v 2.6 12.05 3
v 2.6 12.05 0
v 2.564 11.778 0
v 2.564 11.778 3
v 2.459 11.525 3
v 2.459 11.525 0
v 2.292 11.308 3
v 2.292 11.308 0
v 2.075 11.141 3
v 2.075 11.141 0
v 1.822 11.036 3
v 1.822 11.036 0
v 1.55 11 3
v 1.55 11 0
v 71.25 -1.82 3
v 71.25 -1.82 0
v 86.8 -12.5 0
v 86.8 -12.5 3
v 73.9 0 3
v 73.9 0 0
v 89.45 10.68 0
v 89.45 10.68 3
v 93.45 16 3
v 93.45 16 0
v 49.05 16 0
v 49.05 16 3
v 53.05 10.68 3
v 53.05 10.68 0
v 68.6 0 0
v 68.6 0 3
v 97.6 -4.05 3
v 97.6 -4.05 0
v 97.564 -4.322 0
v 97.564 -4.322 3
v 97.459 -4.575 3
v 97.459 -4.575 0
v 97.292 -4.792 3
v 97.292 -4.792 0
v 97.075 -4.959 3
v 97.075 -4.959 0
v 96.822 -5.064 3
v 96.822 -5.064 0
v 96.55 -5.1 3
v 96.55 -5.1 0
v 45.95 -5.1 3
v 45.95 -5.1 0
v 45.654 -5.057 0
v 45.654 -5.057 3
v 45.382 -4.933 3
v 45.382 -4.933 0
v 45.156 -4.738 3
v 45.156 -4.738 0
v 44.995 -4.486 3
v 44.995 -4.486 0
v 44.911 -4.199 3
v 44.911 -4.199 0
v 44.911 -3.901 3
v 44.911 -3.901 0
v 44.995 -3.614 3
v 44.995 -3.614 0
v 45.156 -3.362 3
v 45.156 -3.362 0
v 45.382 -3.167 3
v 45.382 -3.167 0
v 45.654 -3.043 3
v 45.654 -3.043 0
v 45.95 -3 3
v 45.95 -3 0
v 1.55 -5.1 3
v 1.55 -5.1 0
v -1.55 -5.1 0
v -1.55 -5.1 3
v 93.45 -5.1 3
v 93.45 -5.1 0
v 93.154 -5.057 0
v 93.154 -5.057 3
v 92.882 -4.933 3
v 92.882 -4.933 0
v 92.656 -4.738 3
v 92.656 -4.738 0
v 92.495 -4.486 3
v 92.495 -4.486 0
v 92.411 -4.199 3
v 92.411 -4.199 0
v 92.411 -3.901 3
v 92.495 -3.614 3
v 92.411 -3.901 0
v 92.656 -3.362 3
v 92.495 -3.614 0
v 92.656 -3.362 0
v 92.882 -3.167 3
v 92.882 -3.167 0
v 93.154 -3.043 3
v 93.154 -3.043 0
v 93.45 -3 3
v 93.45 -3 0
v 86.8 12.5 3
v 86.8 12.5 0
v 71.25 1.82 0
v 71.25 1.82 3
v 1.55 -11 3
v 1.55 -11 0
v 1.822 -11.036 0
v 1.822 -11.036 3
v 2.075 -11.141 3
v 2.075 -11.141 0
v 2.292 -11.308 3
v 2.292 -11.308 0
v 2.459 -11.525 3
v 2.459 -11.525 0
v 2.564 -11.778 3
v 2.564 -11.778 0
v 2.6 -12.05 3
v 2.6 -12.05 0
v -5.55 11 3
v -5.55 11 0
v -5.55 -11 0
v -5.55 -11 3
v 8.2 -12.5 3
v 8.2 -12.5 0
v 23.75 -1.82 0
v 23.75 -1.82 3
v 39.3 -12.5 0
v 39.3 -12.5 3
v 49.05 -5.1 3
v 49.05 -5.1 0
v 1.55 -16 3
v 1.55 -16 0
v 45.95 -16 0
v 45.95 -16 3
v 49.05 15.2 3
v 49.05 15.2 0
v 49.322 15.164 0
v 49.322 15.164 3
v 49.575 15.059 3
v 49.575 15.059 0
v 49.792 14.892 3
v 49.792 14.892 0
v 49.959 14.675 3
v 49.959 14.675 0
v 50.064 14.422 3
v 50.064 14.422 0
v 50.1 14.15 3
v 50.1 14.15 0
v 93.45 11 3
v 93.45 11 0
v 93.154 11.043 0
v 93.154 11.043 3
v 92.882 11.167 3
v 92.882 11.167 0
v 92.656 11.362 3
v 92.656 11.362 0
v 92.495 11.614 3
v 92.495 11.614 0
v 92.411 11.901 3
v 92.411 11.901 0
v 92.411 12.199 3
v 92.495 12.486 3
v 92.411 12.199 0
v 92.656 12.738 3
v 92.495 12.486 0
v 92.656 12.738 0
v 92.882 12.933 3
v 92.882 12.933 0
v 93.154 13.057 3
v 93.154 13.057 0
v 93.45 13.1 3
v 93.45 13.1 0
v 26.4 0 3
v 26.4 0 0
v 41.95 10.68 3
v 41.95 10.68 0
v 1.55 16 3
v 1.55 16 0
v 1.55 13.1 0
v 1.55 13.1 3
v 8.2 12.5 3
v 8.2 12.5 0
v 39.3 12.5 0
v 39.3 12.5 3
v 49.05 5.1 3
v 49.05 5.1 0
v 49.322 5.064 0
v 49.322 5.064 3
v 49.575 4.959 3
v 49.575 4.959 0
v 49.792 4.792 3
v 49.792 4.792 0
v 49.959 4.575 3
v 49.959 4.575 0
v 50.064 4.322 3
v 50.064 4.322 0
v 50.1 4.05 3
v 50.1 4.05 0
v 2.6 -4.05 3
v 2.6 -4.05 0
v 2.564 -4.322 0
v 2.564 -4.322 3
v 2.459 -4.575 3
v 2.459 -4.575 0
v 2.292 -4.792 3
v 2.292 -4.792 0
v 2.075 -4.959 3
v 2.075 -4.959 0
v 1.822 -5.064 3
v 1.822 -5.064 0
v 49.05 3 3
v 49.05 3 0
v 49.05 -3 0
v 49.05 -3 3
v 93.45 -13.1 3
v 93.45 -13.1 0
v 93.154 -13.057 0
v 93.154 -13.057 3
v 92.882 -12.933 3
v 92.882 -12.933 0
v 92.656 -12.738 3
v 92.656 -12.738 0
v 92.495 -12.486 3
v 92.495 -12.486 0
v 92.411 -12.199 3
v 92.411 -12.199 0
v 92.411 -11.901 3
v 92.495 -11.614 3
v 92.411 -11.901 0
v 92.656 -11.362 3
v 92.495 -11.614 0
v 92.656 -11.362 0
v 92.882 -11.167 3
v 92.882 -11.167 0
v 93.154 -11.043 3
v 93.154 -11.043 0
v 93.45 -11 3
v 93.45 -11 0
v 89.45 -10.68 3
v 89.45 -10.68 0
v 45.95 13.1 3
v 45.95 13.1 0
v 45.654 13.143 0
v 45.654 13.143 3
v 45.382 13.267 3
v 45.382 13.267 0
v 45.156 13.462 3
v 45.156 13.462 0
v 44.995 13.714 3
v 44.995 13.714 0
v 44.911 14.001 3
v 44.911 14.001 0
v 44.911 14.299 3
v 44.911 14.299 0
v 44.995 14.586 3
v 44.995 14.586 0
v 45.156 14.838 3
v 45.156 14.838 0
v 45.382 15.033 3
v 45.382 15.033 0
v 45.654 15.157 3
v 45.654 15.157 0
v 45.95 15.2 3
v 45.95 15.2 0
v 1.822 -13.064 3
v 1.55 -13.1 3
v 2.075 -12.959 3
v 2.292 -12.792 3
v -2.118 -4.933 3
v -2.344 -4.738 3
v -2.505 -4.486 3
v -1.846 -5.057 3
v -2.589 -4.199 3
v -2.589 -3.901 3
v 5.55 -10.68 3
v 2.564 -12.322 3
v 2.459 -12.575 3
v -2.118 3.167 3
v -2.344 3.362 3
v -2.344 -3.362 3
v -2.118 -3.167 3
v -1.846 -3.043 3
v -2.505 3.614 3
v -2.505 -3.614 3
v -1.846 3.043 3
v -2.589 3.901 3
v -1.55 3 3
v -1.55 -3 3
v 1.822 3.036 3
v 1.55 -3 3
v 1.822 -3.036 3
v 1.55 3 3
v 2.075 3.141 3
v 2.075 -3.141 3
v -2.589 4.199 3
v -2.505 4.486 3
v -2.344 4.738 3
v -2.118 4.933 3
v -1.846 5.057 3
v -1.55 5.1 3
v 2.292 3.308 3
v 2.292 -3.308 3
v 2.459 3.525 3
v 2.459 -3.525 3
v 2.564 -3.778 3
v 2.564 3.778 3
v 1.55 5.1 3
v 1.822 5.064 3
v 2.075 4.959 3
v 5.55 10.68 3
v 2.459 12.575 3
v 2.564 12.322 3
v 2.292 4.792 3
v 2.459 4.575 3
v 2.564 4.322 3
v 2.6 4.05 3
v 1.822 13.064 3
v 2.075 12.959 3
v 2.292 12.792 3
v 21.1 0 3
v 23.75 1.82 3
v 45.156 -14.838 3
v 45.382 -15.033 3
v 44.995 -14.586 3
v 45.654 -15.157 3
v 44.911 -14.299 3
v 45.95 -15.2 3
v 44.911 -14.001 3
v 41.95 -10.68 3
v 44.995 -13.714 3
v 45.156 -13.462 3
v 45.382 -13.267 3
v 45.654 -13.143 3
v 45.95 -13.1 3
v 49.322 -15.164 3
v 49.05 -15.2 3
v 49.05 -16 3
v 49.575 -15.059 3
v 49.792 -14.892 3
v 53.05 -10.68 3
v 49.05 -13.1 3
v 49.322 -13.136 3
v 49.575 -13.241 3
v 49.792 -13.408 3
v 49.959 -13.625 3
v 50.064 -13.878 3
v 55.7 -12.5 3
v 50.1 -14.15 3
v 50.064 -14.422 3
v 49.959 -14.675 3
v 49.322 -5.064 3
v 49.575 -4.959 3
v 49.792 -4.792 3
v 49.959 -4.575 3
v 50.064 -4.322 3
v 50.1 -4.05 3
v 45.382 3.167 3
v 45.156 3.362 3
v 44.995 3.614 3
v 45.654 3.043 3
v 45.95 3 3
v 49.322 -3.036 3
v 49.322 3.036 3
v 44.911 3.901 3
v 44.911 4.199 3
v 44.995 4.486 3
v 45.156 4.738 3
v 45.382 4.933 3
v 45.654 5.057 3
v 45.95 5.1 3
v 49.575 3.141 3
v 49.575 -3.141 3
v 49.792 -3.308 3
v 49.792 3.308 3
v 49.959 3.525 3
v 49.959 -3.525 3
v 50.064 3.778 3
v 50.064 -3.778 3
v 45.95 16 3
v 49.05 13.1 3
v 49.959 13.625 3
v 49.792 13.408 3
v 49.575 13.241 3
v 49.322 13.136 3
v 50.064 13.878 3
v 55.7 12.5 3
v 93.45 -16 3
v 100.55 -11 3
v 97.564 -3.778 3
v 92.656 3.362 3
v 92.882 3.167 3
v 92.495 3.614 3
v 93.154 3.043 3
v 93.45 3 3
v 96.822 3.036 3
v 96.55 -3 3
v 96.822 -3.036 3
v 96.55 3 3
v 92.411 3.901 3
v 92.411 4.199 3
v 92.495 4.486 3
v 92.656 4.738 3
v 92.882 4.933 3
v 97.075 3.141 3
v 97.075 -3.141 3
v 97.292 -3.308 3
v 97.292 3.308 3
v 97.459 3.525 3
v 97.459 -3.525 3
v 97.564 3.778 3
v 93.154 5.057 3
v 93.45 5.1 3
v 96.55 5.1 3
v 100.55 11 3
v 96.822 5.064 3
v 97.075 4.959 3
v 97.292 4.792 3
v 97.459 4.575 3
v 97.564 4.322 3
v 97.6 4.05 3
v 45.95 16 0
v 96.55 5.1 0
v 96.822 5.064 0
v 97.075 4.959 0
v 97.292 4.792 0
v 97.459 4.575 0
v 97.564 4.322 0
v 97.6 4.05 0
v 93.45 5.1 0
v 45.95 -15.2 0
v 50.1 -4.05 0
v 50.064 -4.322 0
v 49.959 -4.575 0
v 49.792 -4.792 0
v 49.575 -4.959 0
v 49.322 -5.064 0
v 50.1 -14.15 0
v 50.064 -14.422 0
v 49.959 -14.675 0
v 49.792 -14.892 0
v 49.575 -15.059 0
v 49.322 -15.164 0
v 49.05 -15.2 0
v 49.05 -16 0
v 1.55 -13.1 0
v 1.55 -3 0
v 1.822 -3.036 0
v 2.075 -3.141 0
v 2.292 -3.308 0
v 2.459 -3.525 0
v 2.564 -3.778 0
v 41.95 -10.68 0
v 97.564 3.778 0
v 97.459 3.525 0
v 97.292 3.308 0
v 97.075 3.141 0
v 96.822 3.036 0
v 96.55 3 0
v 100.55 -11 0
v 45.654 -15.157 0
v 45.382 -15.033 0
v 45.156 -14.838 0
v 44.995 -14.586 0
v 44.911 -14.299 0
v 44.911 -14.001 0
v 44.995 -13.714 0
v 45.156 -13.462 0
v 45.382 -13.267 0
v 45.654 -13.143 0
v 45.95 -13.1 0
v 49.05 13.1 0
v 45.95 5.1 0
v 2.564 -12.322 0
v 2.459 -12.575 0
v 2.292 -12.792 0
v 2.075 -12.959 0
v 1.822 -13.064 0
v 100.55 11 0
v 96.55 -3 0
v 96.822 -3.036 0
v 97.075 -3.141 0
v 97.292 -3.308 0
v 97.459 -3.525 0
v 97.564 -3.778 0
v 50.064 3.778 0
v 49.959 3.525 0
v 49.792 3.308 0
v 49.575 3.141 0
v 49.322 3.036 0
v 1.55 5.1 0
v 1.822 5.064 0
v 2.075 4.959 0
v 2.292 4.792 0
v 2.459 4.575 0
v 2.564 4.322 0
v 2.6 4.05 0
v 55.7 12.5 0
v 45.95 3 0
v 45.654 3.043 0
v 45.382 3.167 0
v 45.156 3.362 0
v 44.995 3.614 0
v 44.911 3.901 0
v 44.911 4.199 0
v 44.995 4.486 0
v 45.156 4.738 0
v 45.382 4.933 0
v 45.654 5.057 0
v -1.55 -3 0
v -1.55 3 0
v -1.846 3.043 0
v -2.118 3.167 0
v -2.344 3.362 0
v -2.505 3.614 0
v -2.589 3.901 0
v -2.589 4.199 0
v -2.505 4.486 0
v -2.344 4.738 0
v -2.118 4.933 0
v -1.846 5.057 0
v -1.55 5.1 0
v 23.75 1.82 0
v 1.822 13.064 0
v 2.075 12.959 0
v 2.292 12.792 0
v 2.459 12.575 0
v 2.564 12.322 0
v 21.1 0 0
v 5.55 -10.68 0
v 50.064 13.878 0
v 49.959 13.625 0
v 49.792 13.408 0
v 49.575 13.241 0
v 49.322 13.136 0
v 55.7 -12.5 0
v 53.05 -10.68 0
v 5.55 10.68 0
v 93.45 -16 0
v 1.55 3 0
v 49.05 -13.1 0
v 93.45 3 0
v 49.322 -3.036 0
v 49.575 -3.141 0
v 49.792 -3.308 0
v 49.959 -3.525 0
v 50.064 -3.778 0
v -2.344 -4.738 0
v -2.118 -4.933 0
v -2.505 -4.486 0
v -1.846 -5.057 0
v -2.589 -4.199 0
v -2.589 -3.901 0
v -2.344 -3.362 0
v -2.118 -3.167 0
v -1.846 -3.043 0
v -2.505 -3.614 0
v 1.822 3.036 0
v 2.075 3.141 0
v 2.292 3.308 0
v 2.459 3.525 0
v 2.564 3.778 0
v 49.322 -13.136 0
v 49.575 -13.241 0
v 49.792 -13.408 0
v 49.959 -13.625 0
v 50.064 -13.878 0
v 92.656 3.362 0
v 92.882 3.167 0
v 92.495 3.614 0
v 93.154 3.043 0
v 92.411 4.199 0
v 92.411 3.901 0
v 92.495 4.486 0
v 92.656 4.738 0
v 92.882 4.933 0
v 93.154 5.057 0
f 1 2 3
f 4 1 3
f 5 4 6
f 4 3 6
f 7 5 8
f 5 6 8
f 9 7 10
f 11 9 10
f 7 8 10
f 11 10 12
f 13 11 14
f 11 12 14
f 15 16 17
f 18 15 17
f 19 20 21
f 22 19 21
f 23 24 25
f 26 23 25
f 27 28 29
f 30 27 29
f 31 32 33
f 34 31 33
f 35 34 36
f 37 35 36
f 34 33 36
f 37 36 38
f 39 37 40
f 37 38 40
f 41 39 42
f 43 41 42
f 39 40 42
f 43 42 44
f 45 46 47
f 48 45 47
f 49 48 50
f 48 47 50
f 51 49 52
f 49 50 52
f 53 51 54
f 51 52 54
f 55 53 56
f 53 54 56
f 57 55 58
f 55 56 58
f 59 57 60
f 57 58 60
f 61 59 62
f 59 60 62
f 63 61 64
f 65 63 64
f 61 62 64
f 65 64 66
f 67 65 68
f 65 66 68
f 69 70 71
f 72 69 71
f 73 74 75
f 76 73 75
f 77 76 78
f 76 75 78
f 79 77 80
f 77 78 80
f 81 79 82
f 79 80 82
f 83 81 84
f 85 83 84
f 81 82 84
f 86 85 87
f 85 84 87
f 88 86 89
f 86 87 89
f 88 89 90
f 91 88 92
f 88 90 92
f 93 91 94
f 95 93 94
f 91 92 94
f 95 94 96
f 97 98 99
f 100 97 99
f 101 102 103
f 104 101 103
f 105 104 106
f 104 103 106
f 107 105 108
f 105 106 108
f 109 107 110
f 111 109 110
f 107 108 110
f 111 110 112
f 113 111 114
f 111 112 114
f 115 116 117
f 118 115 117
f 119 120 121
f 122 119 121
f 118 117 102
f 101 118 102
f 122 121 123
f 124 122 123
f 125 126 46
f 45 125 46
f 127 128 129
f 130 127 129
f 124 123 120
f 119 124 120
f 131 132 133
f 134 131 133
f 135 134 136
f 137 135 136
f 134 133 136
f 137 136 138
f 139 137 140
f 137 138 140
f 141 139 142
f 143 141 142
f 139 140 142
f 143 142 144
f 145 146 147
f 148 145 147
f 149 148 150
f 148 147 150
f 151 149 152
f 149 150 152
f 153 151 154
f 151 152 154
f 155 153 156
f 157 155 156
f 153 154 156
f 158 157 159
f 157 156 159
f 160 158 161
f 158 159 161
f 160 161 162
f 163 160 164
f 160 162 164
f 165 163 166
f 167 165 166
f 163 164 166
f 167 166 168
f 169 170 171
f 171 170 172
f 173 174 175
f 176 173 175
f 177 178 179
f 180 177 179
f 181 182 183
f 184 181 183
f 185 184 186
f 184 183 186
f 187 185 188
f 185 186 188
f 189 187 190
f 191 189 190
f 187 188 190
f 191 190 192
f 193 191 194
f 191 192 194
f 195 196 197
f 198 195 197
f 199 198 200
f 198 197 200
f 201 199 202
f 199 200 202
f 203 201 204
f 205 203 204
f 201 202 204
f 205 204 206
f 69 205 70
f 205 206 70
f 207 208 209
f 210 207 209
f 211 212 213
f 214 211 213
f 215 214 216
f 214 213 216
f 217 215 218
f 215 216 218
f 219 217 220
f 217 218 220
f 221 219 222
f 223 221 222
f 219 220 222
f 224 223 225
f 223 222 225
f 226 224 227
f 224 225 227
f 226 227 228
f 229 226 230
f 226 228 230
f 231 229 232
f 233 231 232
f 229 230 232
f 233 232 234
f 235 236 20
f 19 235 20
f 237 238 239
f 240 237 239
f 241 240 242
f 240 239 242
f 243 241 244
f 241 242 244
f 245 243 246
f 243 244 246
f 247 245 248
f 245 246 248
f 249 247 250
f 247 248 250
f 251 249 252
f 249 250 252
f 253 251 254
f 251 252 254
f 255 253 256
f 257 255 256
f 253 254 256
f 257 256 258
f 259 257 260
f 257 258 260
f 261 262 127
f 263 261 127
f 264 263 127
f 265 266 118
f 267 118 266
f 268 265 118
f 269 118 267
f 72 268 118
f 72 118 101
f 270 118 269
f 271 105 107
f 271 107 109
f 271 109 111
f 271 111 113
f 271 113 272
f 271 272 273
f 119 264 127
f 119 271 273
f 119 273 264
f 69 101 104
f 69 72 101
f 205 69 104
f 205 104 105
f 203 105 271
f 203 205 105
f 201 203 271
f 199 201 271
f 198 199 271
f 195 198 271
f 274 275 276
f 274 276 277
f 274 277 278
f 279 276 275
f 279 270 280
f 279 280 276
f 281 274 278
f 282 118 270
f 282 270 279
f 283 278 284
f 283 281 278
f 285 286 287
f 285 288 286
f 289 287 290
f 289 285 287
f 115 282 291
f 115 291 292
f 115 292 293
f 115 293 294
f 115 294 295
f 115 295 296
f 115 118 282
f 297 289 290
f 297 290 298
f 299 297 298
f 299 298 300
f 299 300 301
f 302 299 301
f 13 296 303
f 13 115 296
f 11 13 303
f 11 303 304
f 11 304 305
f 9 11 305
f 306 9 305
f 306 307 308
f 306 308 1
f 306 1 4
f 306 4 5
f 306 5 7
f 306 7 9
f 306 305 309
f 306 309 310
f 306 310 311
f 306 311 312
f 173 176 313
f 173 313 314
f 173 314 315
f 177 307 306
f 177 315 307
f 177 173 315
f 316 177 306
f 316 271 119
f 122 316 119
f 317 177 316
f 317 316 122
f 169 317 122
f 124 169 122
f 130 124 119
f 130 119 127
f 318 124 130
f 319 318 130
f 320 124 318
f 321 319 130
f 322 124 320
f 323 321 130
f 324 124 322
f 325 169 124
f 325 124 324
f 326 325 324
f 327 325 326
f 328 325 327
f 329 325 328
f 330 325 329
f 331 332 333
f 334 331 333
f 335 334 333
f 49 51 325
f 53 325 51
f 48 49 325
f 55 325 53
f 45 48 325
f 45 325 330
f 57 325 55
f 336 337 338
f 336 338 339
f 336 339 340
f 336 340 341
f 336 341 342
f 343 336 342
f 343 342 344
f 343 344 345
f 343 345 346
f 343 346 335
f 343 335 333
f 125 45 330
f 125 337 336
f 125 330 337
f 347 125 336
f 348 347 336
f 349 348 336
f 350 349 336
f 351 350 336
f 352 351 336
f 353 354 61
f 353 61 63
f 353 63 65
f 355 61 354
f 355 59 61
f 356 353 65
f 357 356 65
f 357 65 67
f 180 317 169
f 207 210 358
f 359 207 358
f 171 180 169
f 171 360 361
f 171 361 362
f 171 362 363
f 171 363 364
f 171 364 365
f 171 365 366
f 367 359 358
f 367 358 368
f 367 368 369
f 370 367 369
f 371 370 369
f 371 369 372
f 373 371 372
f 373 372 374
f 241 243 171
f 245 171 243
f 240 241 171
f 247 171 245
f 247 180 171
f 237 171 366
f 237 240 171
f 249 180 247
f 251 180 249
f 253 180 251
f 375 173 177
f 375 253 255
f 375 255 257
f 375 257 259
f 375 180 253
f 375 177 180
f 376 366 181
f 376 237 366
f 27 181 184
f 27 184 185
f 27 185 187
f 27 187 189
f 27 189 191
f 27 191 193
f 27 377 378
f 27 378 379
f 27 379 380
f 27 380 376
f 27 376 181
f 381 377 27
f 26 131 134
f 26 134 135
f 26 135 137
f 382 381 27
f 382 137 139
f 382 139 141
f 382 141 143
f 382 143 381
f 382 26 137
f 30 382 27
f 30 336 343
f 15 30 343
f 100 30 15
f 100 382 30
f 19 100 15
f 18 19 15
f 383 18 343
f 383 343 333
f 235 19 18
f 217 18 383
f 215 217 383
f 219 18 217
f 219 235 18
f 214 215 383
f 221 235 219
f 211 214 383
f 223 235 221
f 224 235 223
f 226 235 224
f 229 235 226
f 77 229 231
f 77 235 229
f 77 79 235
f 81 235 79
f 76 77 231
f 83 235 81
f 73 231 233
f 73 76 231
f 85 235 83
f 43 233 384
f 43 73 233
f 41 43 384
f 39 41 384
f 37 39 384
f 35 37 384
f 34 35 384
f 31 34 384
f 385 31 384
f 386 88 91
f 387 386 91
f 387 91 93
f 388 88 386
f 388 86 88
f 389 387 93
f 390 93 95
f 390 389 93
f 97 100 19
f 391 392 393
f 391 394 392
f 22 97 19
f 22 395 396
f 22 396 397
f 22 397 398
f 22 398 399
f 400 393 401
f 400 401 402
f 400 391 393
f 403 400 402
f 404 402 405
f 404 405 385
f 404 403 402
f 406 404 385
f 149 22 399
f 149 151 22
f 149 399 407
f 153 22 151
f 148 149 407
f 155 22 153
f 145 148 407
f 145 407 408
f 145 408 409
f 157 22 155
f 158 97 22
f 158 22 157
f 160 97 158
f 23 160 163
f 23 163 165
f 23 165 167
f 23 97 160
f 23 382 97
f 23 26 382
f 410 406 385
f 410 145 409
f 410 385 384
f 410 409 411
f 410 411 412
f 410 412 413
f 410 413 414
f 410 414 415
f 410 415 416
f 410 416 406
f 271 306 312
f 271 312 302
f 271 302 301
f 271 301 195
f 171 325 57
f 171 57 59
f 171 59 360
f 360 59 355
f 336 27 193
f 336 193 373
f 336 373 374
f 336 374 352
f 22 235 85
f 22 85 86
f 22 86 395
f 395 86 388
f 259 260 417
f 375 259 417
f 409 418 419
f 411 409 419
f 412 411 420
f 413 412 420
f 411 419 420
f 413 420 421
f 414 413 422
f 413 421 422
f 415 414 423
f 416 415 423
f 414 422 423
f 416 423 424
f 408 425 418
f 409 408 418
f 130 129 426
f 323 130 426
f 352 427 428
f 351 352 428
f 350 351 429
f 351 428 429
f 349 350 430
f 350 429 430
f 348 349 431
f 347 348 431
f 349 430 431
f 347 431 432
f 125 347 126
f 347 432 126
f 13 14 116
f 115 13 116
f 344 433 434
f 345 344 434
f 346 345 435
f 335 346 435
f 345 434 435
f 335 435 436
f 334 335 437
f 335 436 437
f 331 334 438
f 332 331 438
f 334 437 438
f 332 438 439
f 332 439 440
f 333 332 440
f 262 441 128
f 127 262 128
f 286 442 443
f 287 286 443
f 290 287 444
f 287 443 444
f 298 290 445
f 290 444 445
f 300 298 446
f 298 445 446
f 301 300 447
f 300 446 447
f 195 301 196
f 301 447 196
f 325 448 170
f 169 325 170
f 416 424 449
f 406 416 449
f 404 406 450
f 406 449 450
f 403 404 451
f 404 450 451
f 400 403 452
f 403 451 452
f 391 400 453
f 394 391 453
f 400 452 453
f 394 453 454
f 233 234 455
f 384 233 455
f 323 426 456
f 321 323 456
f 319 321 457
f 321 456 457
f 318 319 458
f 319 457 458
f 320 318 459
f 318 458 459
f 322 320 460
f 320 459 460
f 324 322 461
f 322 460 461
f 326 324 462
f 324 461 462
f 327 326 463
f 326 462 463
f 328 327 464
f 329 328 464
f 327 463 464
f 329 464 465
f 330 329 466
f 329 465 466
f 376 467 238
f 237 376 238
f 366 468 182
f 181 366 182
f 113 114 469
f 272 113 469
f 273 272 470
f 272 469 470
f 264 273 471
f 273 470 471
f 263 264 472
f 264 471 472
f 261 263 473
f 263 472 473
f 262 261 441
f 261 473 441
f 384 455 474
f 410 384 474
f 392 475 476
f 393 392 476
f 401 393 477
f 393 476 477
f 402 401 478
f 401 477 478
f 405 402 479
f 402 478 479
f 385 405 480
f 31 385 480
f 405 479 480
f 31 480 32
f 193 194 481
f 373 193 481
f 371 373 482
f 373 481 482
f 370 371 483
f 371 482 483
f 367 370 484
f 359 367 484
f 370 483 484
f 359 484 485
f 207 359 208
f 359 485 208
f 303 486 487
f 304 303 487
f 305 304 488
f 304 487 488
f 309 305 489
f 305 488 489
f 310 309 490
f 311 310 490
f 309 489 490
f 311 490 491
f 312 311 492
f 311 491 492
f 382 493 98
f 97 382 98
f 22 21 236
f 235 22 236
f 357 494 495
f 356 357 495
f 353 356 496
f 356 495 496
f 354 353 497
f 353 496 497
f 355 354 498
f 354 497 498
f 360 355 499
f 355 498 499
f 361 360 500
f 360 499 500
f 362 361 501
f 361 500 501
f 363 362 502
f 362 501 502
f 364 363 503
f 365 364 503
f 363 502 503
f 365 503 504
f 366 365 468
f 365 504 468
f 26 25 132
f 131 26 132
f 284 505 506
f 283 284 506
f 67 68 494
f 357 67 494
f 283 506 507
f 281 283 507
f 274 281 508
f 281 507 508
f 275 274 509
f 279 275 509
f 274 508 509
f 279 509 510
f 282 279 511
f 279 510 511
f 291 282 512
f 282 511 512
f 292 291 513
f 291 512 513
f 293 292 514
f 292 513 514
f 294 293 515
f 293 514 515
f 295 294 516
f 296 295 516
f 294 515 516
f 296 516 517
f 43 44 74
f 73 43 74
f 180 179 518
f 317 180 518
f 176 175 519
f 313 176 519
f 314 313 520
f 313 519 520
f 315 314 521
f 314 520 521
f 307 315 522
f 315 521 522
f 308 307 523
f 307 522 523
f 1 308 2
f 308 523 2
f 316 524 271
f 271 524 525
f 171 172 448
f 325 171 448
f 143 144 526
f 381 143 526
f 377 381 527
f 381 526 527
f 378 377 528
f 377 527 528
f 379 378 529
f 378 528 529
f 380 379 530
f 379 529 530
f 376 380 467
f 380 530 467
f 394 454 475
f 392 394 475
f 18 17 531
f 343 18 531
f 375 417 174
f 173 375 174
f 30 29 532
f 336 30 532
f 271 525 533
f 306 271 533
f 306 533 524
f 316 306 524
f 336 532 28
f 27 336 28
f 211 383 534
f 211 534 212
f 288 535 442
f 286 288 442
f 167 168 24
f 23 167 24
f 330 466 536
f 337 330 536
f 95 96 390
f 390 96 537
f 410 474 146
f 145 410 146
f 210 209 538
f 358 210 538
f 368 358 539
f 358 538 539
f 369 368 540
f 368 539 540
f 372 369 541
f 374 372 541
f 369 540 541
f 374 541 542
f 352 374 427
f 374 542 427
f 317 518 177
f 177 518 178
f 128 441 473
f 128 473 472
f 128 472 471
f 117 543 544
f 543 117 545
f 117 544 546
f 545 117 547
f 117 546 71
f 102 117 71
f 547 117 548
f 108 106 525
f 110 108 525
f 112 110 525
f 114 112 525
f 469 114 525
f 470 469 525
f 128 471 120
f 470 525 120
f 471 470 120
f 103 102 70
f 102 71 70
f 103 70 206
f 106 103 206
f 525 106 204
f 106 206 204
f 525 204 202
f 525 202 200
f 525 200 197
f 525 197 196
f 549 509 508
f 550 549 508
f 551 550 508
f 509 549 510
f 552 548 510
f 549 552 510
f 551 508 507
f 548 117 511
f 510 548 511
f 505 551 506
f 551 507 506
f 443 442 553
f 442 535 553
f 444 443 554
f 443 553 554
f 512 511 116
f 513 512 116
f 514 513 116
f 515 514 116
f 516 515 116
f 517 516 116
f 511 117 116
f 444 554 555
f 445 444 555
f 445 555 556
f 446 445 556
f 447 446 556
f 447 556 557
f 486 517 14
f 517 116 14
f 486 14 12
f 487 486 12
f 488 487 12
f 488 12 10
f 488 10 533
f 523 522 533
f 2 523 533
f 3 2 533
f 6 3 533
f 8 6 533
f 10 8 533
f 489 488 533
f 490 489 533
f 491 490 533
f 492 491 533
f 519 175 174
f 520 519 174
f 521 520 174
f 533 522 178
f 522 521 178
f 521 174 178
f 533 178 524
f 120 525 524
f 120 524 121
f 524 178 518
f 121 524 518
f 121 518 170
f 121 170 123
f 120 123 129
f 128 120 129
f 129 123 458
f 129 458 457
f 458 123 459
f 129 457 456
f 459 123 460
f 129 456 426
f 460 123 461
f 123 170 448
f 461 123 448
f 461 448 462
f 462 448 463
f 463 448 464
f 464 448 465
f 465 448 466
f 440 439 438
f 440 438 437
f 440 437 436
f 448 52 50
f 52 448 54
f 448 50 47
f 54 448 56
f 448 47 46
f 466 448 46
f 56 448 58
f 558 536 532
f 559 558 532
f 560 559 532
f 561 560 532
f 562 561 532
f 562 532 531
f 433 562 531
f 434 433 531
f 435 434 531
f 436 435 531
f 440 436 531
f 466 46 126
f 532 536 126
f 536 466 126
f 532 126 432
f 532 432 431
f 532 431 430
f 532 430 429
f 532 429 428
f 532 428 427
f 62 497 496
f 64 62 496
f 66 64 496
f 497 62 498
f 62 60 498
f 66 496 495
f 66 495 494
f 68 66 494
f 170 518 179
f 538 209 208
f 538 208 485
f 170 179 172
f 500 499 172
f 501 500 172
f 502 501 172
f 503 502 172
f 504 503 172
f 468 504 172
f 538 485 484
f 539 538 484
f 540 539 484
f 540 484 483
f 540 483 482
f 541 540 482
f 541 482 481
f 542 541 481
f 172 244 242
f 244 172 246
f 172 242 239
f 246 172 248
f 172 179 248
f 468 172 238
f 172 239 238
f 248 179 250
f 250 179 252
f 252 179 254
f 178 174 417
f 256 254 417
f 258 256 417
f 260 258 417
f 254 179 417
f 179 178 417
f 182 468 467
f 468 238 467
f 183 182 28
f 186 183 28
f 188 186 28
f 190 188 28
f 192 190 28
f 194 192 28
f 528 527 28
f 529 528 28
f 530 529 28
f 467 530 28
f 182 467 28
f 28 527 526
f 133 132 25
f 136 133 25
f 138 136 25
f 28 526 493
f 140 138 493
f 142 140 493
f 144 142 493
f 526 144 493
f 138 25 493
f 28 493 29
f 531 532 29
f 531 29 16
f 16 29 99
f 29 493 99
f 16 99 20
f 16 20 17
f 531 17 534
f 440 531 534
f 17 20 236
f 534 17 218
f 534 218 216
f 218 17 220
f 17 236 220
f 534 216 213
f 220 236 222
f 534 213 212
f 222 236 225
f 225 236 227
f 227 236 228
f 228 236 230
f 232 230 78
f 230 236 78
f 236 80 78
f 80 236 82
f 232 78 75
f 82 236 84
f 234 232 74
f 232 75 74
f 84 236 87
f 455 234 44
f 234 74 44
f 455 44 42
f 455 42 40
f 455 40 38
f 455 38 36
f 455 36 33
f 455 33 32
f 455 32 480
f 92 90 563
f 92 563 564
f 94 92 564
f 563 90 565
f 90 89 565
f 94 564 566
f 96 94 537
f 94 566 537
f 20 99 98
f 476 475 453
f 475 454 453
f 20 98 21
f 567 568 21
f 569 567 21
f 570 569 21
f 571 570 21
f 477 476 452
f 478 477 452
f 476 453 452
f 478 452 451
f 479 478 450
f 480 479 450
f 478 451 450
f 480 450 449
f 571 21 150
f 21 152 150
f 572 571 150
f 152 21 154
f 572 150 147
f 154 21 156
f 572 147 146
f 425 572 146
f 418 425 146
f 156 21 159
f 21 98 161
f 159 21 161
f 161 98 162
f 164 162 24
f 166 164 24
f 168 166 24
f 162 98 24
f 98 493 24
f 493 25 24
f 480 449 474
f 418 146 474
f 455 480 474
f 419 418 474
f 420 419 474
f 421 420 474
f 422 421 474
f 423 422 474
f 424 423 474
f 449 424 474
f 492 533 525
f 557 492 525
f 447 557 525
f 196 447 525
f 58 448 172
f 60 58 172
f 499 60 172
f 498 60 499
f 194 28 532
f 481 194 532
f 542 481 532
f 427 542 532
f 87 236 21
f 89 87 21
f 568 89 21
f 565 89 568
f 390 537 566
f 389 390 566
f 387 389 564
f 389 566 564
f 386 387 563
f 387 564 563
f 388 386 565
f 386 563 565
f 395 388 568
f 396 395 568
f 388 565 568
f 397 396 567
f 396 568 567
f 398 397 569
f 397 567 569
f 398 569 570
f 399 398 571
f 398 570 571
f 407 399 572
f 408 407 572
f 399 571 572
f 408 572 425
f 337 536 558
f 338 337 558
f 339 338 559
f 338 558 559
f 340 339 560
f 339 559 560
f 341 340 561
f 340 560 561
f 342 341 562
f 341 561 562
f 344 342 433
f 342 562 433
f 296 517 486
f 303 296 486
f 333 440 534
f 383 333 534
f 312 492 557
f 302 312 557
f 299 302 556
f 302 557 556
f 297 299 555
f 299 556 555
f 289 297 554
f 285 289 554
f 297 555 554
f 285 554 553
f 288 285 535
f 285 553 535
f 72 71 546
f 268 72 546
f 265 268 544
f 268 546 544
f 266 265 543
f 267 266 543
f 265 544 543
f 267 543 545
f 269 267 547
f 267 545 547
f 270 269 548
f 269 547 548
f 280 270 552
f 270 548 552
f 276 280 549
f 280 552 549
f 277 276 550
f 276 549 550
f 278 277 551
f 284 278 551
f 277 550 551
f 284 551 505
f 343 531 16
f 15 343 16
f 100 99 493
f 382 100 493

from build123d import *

# Parameters (mm, degrees)
EXTRUDE_1_DEPTH = 3


with BuildPart() as part:
    # 草图1 → 凸台-拉伸1 (new body)
    with BuildSketch(Plane.XY):
        with BuildLine():
            Line((100.55, -11), (100.55, 11))
            Line((100.55, 11), (93.45, 11))
            ThreePointArc((93.45, 11), (92.4, 12.05), (93.45, 13.1))
            Line((93.45, 13.1), (93.45, 16))
            Line((93.45, 16), (49.05, 16))
            Line((49.05, 16), (49.05, 15.2))
            ThreePointArc((49.05, 15.2), (49.79246212, 14.89246212), (50.1, 14.15))
            ThreePointArc((50.1, 14.15), (49.79246212, 13.40753788), (49.05, 13.1))
            Line((49.05, 13.1), (45.95, 13.1))
            ThreePointArc((45.95, 13.1), (44.9, 14.15), (45.95, 15.2))
            Line((45.95, 15.2), (45.95, 16))
            Line((45.95, 16), (1.55, 16))
            Line((1.55, 16), (1.55, 13.1))
            ThreePointArc((1.55, 13.1), (2.29246212, 12.79246212), (2.6, 12.05))
            ThreePointArc((2.6, 12.05), (2.29246212, 11.30753788), (1.55, 11))
            Line((1.55, 11), (-5.55, 11))
            Line((-5.55, 11), (-5.55, -11))
            Line((-5.55, -11), (1.55, -11))
            ThreePointArc((1.55, -11), (2.29246212, -11.30753788), (2.6, -12.05))
            ThreePointArc((2.6, -12.05), (2.29246212, -12.79246212), (1.55, -13.1))
            Line((1.55, -13.1), (1.55, -16))
            Line((1.55, -16), (45.95, -16))
            Line((45.95, -16), (45.95, -15.2))
            ThreePointArc((45.95, -15.2), (44.9, -14.15), (45.95, -13.1))
            Line((45.95, -13.1), (49.05, -13.1))
            ThreePointArc((49.05, -13.1), (49.79246212, -13.40753788), (50.1, -14.15))
            ThreePointArc((50.1, -14.15), (49.79246212, -14.89246212), (49.05, -15.2))
            Line((49.05, -15.2), (49.05, -16))
            Line((49.05, -16), (93.45, -16))
            Line((93.45, -16), (93.45, -13.1))
            ThreePointArc((93.45, -13.1), (92.4, -12.05), (93.45, -11))
            Line((93.45, -11), (100.55, -11))
        make_face()
        with BuildLine():
            ThreePointArc((2.6, -4.05), (2.29246212, -4.79246212), (1.55, -5.1))
            Line((1.55, -5.1), (-1.55, -5.1))
            ThreePointArc((-1.55, -5.1), (-2.6, -4.05), (-1.55, -3))
            Line((-1.55, -3), (-1.55, 3))
            ThreePointArc((-1.55, 3), (-2.6, 4.05), (-1.55, 5.1))
            Line((-1.55, 5.1), (1.55, 5.1))
            ThreePointArc((1.55, 5.1), (2.29246212, 4.79246212), (2.6, 4.05))
            ThreePointArc((2.6, 4.05), (2.29246212, 3.30753788), (1.55, 3))
            Line((1.55, 3), (1.55, -3))
            ThreePointArc((1.55, -3), (2.29246212, -3.30753788), (2.6, -4.05))
        make_face(mode=Mode.SUBTRACT)
        Polygon((39.300498915, -12.5), (8.199501085, -12.5), (23.75, -1.819712284), align=None, mode=Mode.SUBTRACT)
        Polygon((55.699501085, -12.5), (71.25, -1.819712284), (86.800498915, -12.5), align=None, mode=Mode.SUBTRACT)
        with BuildLine():
            ThreePointArc((97.6, -4.05), (97.29246212, -4.79246212), (96.55, -5.1))
            Line((96.55, -5.1), (93.45, -5.1))
            ThreePointArc((93.45, -5.1), (92.4, -4.05), (93.45, -3))
            Line((93.45, -3), (93.45, 3))
            ThreePointArc((93.45, 3), (92.4, 4.05), (93.45, 5.1))
            Line((93.45, 5.1), (96.55, 5.1))
            ThreePointArc((96.55, 5.1), (97.29246212, 4.79246212), (97.6, 4.05))
            ThreePointArc((97.6, 4.05), (97.29246212, 3.30753788), (96.55, 3))
            Line((96.55, 3), (96.55, -3))
            ThreePointArc((96.55, -3), (97.29246212, -3.30753788), (97.6, -4.05))
        make_face(mode=Mode.SUBTRACT)
        Polygon((21.100498915, 0), (5.55, -10.680287716), (5.55, 10.680287716), align=None, mode=Mode.SUBTRACT)
        Polygon((26.399501085, 0), (41.95, 10.680287716), (41.95, -10.680287716), align=None, mode=Mode.SUBTRACT)
        Polygon((23.75, 1.819712284), (8.199501085, 12.5), (39.300498915, 12.5), align=None, mode=Mode.SUBTRACT)
        with BuildLine():
            ThreePointArc((50.1, -4.05), (49.79246212, -4.79246212), (49.05, -5.1))
            Line((49.05, -5.1), (45.95, -5.1))
            ThreePointArc((45.95, -5.1), (44.9, -4.05), (45.95, -3))
            Line((45.95, -3), (45.95, 3))
            ThreePointArc((45.95, 3), (44.9, 4.05), (45.95, 5.1))
            Line((45.95, 5.1), (49.05, 5.1))
            ThreePointArc((49.05, 5.1), (49.79246212, 4.79246212), (50.1, 4.05))
            ThreePointArc((50.1, 4.05), (49.79246212, 3.30753788), (49.05, 3))
            Line((49.05, 3), (49.05, -3))
            ThreePointArc((49.05, -3), (49.79246212, -3.30753788), (50.1, -4.05))
        make_face(mode=Mode.SUBTRACT)
        Polygon((53.05, 10.680287716), (68.600498915, 0), (53.05, -10.680287716), align=None, mode=Mode.SUBTRACT)
        Polygon((55.699501085, 12.5), (86.800498915, 12.5), (71.25, 1.819712284), align=None, mode=Mode.SUBTRACT)
        Polygon((89.45, 10.680287716), (89.45, -10.680287716), (73.899501085, 0), align=None, mode=Mode.SUBTRACT)
    extrude(amount=EXTRUDE_1_DEPTH)


solid = part.part
